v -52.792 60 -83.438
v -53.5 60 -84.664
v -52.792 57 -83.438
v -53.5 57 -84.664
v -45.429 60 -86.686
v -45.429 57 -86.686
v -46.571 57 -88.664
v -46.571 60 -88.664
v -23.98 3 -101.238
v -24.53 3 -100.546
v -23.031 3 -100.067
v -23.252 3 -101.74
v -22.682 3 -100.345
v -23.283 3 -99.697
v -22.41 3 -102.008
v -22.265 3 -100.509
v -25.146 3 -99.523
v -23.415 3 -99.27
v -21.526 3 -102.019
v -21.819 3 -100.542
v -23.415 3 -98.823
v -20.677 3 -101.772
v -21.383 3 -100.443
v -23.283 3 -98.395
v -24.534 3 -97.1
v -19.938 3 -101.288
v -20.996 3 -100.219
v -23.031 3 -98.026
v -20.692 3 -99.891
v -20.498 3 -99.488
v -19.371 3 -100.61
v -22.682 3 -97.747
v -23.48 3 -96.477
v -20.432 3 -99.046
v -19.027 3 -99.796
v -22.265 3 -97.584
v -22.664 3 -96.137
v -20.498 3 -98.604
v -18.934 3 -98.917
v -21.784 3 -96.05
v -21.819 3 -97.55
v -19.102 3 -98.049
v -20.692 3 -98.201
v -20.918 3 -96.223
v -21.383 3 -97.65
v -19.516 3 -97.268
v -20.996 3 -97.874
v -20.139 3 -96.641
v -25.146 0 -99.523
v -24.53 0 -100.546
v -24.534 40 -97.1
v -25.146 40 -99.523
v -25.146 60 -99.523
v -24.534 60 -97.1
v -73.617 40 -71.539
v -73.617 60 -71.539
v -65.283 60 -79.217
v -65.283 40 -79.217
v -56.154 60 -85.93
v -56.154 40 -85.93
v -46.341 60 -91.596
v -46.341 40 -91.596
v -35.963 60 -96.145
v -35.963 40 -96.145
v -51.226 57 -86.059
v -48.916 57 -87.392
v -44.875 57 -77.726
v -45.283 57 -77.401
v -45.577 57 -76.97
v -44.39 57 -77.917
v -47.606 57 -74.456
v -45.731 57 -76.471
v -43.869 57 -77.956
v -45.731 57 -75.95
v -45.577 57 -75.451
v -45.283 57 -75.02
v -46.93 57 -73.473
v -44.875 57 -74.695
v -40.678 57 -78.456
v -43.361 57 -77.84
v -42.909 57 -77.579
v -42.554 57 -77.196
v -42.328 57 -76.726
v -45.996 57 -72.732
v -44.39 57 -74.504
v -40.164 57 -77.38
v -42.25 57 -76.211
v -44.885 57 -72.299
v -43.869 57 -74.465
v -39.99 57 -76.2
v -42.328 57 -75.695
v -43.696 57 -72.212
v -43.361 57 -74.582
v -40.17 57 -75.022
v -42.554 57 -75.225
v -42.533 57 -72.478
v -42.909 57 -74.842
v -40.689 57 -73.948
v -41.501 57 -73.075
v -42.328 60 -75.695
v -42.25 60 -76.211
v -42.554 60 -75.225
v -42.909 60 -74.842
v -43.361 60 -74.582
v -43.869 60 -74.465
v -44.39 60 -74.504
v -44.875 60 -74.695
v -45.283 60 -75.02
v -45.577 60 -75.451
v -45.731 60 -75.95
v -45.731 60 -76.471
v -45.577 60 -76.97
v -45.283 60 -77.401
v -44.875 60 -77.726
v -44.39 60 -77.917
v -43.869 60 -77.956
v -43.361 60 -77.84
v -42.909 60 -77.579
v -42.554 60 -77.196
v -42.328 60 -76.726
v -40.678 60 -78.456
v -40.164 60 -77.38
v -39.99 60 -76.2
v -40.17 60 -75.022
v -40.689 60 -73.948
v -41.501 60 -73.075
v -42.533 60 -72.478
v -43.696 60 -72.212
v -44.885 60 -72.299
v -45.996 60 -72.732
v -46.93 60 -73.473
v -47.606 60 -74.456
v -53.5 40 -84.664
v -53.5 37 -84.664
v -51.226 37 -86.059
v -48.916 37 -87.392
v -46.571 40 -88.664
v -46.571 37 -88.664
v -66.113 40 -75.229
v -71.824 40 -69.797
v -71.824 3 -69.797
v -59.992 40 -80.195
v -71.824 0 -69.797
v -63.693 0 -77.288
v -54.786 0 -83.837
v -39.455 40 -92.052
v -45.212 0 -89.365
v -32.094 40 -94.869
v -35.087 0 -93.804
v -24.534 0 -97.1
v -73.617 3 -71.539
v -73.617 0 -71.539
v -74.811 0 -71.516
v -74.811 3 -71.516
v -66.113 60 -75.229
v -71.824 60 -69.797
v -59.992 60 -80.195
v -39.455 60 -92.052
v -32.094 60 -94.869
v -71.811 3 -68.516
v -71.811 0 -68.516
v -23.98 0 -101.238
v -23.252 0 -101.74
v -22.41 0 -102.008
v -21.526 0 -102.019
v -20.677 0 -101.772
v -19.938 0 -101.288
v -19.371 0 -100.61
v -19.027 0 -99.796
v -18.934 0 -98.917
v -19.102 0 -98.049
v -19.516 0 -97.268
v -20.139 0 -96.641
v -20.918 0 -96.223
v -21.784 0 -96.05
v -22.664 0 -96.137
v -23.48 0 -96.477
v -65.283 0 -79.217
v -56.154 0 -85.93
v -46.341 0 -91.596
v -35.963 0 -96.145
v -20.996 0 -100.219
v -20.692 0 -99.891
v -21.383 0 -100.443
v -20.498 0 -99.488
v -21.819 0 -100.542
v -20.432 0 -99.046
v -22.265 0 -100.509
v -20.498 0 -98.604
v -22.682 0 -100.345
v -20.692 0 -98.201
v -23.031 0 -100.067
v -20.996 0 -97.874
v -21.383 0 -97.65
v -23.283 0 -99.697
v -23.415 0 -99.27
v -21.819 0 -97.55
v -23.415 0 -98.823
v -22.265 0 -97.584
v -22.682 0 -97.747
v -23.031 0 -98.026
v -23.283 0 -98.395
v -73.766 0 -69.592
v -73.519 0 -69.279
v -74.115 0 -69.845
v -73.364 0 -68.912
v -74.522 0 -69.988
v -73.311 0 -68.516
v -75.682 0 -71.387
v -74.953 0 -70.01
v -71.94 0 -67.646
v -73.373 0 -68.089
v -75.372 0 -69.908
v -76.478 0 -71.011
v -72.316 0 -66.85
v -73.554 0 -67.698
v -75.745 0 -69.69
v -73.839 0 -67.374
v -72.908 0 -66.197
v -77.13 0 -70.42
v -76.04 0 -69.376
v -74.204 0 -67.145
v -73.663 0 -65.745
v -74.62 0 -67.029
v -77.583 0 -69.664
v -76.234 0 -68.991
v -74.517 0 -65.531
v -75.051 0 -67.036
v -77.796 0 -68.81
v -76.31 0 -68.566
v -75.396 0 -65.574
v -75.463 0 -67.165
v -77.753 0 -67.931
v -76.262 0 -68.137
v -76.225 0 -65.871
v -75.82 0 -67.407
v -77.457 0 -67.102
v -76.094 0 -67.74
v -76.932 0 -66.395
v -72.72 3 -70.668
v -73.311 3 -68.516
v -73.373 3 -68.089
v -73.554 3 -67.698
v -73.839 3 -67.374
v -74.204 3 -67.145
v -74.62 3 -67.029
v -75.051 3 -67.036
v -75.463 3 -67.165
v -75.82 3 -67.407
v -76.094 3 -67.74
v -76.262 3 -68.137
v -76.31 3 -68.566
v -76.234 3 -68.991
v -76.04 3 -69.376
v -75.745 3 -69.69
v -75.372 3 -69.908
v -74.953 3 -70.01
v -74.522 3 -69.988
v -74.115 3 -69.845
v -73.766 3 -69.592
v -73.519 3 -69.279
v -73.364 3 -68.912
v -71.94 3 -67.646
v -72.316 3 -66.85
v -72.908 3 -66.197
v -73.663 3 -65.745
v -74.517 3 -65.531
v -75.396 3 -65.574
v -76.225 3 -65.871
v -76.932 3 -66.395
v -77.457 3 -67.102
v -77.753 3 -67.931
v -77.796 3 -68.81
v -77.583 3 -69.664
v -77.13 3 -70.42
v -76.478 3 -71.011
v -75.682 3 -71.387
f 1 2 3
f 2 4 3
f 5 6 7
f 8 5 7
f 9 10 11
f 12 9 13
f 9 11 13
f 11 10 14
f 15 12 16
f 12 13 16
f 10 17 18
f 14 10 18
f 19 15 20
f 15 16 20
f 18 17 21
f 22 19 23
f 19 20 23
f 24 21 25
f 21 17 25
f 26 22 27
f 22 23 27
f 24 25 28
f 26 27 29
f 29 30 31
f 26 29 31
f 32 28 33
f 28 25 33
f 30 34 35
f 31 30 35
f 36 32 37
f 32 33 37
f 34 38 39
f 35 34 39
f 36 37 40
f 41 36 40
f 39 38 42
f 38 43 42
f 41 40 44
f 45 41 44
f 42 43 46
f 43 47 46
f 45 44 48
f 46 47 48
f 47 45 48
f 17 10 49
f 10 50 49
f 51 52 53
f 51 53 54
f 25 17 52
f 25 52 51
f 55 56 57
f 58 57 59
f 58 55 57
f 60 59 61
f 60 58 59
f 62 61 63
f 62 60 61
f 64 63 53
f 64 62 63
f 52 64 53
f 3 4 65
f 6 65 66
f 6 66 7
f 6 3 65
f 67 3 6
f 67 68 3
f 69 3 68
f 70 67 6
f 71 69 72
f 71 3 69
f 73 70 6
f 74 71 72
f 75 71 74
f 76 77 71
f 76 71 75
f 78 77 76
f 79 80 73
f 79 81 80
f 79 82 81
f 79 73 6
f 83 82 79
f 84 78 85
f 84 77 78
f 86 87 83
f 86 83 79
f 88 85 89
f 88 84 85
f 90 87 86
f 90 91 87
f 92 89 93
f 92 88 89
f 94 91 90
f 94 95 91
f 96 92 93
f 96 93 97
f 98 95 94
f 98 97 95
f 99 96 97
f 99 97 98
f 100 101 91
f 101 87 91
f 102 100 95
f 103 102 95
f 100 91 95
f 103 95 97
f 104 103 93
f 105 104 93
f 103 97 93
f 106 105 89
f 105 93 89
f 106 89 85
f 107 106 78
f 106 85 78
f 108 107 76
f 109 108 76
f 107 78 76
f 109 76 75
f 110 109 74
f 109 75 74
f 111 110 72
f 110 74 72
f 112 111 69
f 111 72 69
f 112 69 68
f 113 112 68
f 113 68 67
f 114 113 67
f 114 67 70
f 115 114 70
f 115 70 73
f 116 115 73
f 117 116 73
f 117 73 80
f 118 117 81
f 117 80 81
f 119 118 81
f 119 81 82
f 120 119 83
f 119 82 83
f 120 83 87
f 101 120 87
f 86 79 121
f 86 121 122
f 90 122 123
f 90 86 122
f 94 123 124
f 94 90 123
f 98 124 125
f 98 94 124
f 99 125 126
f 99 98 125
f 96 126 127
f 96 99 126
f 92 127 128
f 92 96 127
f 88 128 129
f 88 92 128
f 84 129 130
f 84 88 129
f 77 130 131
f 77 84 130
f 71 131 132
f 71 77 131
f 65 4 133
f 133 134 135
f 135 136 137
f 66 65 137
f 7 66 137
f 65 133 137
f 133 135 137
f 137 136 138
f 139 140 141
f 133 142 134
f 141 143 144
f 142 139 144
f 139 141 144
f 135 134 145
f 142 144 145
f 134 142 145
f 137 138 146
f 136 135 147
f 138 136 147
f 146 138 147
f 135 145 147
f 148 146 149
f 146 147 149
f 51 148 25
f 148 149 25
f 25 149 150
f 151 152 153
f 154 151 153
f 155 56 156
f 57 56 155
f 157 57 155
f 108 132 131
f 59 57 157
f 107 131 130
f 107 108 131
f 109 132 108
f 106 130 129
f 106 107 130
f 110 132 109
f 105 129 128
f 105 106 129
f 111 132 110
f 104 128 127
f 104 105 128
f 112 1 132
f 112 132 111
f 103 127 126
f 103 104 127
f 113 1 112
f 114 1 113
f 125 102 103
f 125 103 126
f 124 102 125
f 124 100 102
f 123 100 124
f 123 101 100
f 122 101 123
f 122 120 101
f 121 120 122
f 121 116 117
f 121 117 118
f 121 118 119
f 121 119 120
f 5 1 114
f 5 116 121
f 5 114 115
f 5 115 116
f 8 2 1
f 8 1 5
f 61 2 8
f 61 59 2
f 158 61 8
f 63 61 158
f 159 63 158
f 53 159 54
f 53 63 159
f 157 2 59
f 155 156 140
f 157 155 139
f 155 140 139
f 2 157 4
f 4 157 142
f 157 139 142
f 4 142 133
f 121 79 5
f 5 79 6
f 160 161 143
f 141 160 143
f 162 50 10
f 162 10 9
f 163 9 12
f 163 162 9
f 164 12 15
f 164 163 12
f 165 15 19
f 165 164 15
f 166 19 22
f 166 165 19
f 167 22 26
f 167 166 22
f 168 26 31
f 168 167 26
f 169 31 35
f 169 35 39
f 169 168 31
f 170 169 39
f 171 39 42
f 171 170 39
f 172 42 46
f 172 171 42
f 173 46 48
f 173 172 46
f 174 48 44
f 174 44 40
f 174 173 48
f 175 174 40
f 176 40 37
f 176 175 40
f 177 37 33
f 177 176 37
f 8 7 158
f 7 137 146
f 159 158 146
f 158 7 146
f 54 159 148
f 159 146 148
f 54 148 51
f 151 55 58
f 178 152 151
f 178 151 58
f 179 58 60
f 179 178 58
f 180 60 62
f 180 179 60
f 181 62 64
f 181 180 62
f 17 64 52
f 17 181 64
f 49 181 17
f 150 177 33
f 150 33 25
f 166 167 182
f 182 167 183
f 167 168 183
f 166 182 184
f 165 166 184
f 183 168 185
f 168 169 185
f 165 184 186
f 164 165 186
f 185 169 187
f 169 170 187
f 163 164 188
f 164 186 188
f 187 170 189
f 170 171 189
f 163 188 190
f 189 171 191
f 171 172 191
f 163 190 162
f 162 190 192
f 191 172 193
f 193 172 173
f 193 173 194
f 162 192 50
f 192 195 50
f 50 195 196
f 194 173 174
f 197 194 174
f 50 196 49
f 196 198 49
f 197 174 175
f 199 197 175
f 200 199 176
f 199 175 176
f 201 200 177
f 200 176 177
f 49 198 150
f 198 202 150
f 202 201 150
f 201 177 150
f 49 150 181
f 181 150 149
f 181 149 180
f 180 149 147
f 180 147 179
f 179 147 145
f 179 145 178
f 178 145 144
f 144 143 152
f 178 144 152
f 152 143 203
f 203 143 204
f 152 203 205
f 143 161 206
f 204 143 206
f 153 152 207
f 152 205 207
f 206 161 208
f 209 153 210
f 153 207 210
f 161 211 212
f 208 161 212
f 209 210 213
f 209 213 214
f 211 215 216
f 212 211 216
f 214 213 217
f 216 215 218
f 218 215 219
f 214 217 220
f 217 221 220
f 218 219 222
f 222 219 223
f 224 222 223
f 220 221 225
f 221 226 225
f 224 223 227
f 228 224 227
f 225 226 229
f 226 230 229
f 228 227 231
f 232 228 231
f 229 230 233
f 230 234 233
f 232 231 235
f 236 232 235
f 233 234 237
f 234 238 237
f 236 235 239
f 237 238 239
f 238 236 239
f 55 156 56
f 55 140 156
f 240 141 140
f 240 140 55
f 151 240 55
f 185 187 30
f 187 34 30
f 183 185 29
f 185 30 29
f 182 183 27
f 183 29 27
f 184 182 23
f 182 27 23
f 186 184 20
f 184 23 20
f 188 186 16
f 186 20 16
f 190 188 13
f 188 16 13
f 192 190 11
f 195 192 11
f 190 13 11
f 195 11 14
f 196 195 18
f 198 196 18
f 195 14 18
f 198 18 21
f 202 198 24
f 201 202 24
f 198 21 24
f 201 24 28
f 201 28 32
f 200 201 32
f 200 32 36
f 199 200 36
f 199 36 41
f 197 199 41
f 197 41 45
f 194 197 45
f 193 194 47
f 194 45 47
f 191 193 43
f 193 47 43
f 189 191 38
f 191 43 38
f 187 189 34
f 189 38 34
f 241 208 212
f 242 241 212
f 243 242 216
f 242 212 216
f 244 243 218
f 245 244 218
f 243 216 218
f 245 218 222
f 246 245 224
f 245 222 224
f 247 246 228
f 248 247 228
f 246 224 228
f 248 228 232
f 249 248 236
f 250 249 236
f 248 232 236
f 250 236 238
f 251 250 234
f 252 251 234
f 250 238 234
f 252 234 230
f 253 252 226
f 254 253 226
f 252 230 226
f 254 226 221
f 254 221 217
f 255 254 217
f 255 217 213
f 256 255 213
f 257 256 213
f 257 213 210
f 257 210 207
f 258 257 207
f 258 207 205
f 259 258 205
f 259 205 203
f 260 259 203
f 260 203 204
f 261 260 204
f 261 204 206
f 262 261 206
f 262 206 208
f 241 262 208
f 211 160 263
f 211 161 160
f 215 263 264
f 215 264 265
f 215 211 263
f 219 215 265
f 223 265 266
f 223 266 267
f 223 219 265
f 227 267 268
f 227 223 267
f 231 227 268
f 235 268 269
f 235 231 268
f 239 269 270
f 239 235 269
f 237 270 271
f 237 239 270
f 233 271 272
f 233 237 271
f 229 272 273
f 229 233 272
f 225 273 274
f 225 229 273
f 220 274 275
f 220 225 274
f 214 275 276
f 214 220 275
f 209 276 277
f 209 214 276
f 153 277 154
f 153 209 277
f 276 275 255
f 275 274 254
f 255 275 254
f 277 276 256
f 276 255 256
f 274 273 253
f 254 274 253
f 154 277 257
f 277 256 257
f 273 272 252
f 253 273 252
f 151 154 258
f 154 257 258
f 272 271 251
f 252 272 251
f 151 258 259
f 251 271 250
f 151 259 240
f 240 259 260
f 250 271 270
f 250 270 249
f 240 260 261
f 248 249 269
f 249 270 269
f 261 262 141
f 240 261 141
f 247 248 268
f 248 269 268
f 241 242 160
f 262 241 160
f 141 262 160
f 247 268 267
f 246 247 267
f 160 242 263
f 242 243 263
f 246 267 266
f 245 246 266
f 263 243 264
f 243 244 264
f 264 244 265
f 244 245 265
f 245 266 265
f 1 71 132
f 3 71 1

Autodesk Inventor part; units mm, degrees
ref_plane "YZ Plane" through (0, 0, 0) normal (1, 0, 0) x (0, 1, 0)
ref_plane "XZ Plane" through (0, 0, 0) normal (0, 1, 0) x (-1, 0, 0)
ref_plane "XY Plane" through (0, 0, 0) normal (0, 0, 1) x (1, 0, 0)
sketch "Sketch1" plane through (0, 0, 0) normal (0, 1, 0) x (-1, 0, 0)
  circle A0 centre (0, 0) radius 100.151
  line L0 (0, 0) -> (50.0755, -86.7333)
  line L1 (0, 0) -> (100.151, 0) construction
  line L2 (0, 0) -> (50.0755, 86.7333)
  line L3 (0, 0) -> (100.151, 0) construction
  line L4 (0, 0) -> (-100.151, 0)
  line L5 (50.0755, -86.7333) -> (100.0755, -86.7333) construction
  line L6 (50.0755, -86.7333) -> (24.5339, -97.0995)
  line L7 (50.0755, -86.7333) -> (100.0755, -86.7333) construction
  line L8 (71.8237, -69.7967) -> (50.0755, -86.7333)
  circle A1 centre (0, 0) radius 102.651
  line L9 (0, 0) -> (71.8237, -69.7967)
  line L10 (71.8237, -69.7967) -> (73.6166, -71.539)
  line L11 (0, 0) -> (24.5339, -97.0995)
  line L12 (24.5339, -97.0995) -> (25.1463, -99.5233)
  dimension "d0" = 200.302
  dimension "d1" = 60
  dimension "d2" = 60
  dimension "d8" = 205.302
extrude "Extrusion1" add sketch "Sketch1" along normal blind 40 contours L10 A1 L12 A0 picked at (67.2642, -76.2102)
sketch "Sketch2" plane through (0, 0, 0) normal (0, -1, 0) x (1, 0, 0)
  line L0 (-24.5339, -97.0995) -> (-25.1463, -99.5233) projected
  line L1 (-24.8401, -98.3114) -> (-21.9315, -99.0463)
  circle A0 centre (-21.9315, -99.0463) radius 1.5
  line L2 (-73.6166, -71.539) -> (-71.8237, -69.7967) projected
  line L3 (-72.7201, -70.6679) -> (-74.8716, -72.7586)
  line L4 (-74.8716, -72.7586) -> (-72.7201, -70.6679)
  line L5 (-72.7201, -70.6679) -> (-74.8109, -68.5164)
  circle A1 centre (-74.8109, -68.5164) radius 1.5
  circle A2 centre (-74.8109, -68.5164) radius 3
  arc A3 (-73.6166, -71.539) -> (-25.1463, -99.5233) centre (0, 0) ccw projected
  line L6 (-73.6166, -71.539) -> (-74.8109, -71.5164)
  arc A4 (-71.8237, -69.7967) -> (-24.5339, -97.0995) centre (0, 0) ccw projected
  line L7 (-71.8109, -68.5164) -> (-71.8237, -69.7967)
  circle A5 centre (-21.9315, -99.0463) radius 3
  line L8 (-21.9315, -99.0463) -> (-24.5296, -100.5463)
  line L9 (-21.9315, -99.0463) -> (-18.9315, -99.0463) construction
  line L10 (-24.5296, -100.5463) -> (-25.1463, -99.5233)
  arc A6 (-22.1585, -98.9889) -> (-21.9315, -99.0463) centre (-21.9315, -98.5684) ccw
  line L11 (-21.9315, -99.0463) -> (-22.9003, -97.4384)
  line L12 (-21.9315, -99.0463) -> (-20.0543, -99.0463) construction
  line L13 (-22.9003, -97.4384) -> (-23.4798, -96.4767)
  line L14 (-23.4798, -96.4767) -> (-24.5339, -97.0995)
  point P0 (0, 0)
  dimension "d12" = 3
  dimension "d13" = 3
  dimension "d14" = 3
  dimension "d15" = 210
  dimension "d16" = 121.07
extrude "Extrusion2" add sketch "Sketch2" against normal blind 3 contours L14 A5 L0 | L7 L2 A2 | A5 L10 L0 | A5 L13 L11 A0 L1 | L1 A0 L8 A5 | A5 L8 A0 L11 L13 | A0 L11 L1 | L1 A6 L8 A0 | L2 L6 A2 | A2 | L1 A6 | A0 L8 L11
sketch "Sketch3" plane through (0, 3, 0) normal (0, 1, 0) x (1, 0, 0)
  arc A0 (-23.4798, 96.4767) -> (-24.5296, 100.5463) centre (-21.9315, 99.0463) ccw projected
  circle A1 centre (-21.9315, 99.0463) radius 1.5
  point P0 (0, 0)
  dimension "d19" = 3
extrude "Extrusion3" cut sketch "Sketch3" against normal blind 3
sketch "Sketch4" plane through (-25.1463, 3, -99.5233) normal (0.9695, 0, -0.245) x (-0.245, 0, -0.9695)
  point P0 (-102.651, -3)
sketch "Sketch5" plane through (0, 40, 0) normal (0, 1, 0) x (1, 0, 0)
  circle A0 centre (-74.8109, 68.5164) radius 1.5 projected
  circle A1 centre (-21.9315, 99.0463) radius 1.5 projected
  line L0 (-74.8109, 68.5164) -> (-21.9315, 99.0463)
  circle A2 centre (-48.3712, 83.7814) radius 1.75
  circle A3 centre (-48.3712, 83.7814) radius 4
  line L1 (-44.9071, 85.7814) -> (-46.5714, 88.6641)
  arc A4 (-24.5339, 97.0995) -> (-71.8237, 69.7967) centre (0, 0) ccw projected
  line L2 (-51.8353, 81.7814) -> (-53.4996, 84.6641)
  line L3 (-46.5714, 88.6641) -> (-50.0755, 88.3957)
  line L4 (-50.0755, 88.3957) -> (-52.8557, 86.4967)
  line L5 (-52.8557, 86.4967) -> (-53.4996, 84.6641)
  point P0 (0, 0)
  dimension "d22" = 3.5
  dimension "d23" = 8
extrude "Extrusion4" add sketch "Sketch5" against normal blind 3 contours A3 A4 L0 A2 | L0 A2 A3 | L2 A4 A3 | L5 L4 L3 A4 A3 | A2 L0 | L0 A2 | A3 A4 | A3 A4 L1
sketch "Sketch6" plane through (0, 40, 0) normal (0, 1, 0) x (1, 0, 0)
  arc A0 (-51.8353, 81.7814) -> (-44.9071, 85.7814) centre (-48.3712, 83.7814) ccw projected
  circle A1 centre (-48.3712, 83.7814) radius 1.75
  point P0 (0, 0)
  dimension "d26" = 3.5
extrude "Extrusion5" cut sketch "Sketch6" against normal blind 3
sketch "Sketch7" plane through (0, 40, 0) normal (0, 1, 0) x (1, 0, 0)
  point P0 (0, 0)
sketch "Sketch8" plane through (0, 40, 0) normal (0, 1, 0) x (1, 0, 0)
  line L0 (0, 0) -> (-59.2945, 80.7117)
  arc A0 (-53.4996, 84.6641) -> (-71.8237, 69.7967) centre (0, 0) ccw projected
sketch "Sketch10" plane through (0, 40, 0) normal (0, 1, 0) x (1, 0, 0)
  circle A0 centre (-21.9315, 99.0463) radius 1.5 projected
  circle A1 centre (-74.8109, 68.5164) radius 1.5 projected
  line L0 (-21.9315, 99.0463) -> (-74.8109, 68.5164)
  line L1 (-48.3712, 83.7814) -> (0, 0)
  line L2 (-48.3712, 83.7814) -> (-44.0002, 76.2106)
  circle A2 centre (-44.0002, 76.2106) radius 1.75
  circle A3 centre (-44.0002, 76.2106) radius 4.01
  line L3 (-47.6057, 74.4556) -> (-52.7918, 83.4382)
  line L4 (-51.8353, 81.7814) -> (-53.4996, 84.6641) projected
  line L5 (-40.6779, 78.4561) -> (-45.4294, 86.686)
  line L6 (-45.4294, 86.686) -> (-49.4653, 86.686)
  line L7 (-49.4653, 86.686) -> (-52.7918, 83.4382)
  dimension "d30" = 96.7424
  dimension "d31" = 8.742
  dimension "d32" = 3.5
extrude "Extrusion6" add sketch "Sketch10" along normal blind 20 and the other way blind 3 contours L5 A3 L1 L0 | L0 L3 L7 L6 L5 | L1 A3 L3 L0 | A3 L1 A2 | L1 A2 A3
sketch "Sketch11" plane through (0, 40, 0) normal (0, 1, 0) x (1, 0, 0)
  arc A0 (-24.5339, 97.0995) -> (-46.5714, 88.6641) centre (0, 0) ccw projected
  arc A1 (-24.5339, 97.0995) -> (-46.5714, 88.6641) centre (0, 0) ccw
  line L0 (-53.4996, 84.6641) -> (-52.7918, 83.4382) projected
  line L1 (-73.6166, 71.539) -> (-71.8237, 69.7967) projected
  arc A2 (-53.4996, 84.6641) -> (-71.8237, 69.7967) centre (0, 0) ccw
  arc A3 (-25.1463, 99.5233) -> (-73.6166, 71.539) centre (0, 0) ccw projected
  arc A4 (-25.1463, 99.5233) -> (-73.6166, 71.539) centre (0, 0) ccw
  line L2 (-25.1463, 99.5233) -> (-24.5339, 97.0995)
  line L3 (-73.6166, 71.539) -> (-71.8237, 69.7967)
  line L4 (-53.4996, 84.6641) -> (-52.7918, 83.4382)
  line L5 (-52.7918, 83.4382) -> (-49.4653, 86.686) projected
  line L6 (-52.7918, 83.4382) -> (-49.4653, 86.686)
  line L7 (-49.4653, 86.686) -> (-45.4294, 86.686) projected
  line L8 (-49.4653, 86.686) -> (-45.4294, 86.686)
  line L9 (-45.4294, 86.686) -> (-46.5714, 88.6641)
  point P0 (0, 0)
  dimension "d37" = 100.151
extrude "Extrusion7" add sketch "Sketch11" along normal blind 20
sketch "Sketch12" plane through (0, 37, 0) normal (0, -1, 0) x (1, 0, 0)
  line L0 (-47.6057, -74.4556) -> (-53.4996, -84.6641) projected
  line L1 (-45.4294, -86.686) -> (-46.5714, -88.6641) projected
  arc A0 (-53.4996, -84.6641) -> (-46.5714, -88.6641) centre (0, 0) ccw
  line L2 (-53.4996, -84.6641) -> (-54.9814, -68.7673)
  line L3 (-54.9814, -68.7673) -> (-38.2505, -67.5322)
  line L4 (-38.2505, -67.5322) -> (-32.7507, -81.5808)
  line L5 (-32.7507, -81.5808) -> (-46.5714, -88.6641)
  point P0 (0, 0)
extrude "Extrusion8" cut sketch "Sketch12" against normal blind 20
properties part number "Wheel Guard1"
